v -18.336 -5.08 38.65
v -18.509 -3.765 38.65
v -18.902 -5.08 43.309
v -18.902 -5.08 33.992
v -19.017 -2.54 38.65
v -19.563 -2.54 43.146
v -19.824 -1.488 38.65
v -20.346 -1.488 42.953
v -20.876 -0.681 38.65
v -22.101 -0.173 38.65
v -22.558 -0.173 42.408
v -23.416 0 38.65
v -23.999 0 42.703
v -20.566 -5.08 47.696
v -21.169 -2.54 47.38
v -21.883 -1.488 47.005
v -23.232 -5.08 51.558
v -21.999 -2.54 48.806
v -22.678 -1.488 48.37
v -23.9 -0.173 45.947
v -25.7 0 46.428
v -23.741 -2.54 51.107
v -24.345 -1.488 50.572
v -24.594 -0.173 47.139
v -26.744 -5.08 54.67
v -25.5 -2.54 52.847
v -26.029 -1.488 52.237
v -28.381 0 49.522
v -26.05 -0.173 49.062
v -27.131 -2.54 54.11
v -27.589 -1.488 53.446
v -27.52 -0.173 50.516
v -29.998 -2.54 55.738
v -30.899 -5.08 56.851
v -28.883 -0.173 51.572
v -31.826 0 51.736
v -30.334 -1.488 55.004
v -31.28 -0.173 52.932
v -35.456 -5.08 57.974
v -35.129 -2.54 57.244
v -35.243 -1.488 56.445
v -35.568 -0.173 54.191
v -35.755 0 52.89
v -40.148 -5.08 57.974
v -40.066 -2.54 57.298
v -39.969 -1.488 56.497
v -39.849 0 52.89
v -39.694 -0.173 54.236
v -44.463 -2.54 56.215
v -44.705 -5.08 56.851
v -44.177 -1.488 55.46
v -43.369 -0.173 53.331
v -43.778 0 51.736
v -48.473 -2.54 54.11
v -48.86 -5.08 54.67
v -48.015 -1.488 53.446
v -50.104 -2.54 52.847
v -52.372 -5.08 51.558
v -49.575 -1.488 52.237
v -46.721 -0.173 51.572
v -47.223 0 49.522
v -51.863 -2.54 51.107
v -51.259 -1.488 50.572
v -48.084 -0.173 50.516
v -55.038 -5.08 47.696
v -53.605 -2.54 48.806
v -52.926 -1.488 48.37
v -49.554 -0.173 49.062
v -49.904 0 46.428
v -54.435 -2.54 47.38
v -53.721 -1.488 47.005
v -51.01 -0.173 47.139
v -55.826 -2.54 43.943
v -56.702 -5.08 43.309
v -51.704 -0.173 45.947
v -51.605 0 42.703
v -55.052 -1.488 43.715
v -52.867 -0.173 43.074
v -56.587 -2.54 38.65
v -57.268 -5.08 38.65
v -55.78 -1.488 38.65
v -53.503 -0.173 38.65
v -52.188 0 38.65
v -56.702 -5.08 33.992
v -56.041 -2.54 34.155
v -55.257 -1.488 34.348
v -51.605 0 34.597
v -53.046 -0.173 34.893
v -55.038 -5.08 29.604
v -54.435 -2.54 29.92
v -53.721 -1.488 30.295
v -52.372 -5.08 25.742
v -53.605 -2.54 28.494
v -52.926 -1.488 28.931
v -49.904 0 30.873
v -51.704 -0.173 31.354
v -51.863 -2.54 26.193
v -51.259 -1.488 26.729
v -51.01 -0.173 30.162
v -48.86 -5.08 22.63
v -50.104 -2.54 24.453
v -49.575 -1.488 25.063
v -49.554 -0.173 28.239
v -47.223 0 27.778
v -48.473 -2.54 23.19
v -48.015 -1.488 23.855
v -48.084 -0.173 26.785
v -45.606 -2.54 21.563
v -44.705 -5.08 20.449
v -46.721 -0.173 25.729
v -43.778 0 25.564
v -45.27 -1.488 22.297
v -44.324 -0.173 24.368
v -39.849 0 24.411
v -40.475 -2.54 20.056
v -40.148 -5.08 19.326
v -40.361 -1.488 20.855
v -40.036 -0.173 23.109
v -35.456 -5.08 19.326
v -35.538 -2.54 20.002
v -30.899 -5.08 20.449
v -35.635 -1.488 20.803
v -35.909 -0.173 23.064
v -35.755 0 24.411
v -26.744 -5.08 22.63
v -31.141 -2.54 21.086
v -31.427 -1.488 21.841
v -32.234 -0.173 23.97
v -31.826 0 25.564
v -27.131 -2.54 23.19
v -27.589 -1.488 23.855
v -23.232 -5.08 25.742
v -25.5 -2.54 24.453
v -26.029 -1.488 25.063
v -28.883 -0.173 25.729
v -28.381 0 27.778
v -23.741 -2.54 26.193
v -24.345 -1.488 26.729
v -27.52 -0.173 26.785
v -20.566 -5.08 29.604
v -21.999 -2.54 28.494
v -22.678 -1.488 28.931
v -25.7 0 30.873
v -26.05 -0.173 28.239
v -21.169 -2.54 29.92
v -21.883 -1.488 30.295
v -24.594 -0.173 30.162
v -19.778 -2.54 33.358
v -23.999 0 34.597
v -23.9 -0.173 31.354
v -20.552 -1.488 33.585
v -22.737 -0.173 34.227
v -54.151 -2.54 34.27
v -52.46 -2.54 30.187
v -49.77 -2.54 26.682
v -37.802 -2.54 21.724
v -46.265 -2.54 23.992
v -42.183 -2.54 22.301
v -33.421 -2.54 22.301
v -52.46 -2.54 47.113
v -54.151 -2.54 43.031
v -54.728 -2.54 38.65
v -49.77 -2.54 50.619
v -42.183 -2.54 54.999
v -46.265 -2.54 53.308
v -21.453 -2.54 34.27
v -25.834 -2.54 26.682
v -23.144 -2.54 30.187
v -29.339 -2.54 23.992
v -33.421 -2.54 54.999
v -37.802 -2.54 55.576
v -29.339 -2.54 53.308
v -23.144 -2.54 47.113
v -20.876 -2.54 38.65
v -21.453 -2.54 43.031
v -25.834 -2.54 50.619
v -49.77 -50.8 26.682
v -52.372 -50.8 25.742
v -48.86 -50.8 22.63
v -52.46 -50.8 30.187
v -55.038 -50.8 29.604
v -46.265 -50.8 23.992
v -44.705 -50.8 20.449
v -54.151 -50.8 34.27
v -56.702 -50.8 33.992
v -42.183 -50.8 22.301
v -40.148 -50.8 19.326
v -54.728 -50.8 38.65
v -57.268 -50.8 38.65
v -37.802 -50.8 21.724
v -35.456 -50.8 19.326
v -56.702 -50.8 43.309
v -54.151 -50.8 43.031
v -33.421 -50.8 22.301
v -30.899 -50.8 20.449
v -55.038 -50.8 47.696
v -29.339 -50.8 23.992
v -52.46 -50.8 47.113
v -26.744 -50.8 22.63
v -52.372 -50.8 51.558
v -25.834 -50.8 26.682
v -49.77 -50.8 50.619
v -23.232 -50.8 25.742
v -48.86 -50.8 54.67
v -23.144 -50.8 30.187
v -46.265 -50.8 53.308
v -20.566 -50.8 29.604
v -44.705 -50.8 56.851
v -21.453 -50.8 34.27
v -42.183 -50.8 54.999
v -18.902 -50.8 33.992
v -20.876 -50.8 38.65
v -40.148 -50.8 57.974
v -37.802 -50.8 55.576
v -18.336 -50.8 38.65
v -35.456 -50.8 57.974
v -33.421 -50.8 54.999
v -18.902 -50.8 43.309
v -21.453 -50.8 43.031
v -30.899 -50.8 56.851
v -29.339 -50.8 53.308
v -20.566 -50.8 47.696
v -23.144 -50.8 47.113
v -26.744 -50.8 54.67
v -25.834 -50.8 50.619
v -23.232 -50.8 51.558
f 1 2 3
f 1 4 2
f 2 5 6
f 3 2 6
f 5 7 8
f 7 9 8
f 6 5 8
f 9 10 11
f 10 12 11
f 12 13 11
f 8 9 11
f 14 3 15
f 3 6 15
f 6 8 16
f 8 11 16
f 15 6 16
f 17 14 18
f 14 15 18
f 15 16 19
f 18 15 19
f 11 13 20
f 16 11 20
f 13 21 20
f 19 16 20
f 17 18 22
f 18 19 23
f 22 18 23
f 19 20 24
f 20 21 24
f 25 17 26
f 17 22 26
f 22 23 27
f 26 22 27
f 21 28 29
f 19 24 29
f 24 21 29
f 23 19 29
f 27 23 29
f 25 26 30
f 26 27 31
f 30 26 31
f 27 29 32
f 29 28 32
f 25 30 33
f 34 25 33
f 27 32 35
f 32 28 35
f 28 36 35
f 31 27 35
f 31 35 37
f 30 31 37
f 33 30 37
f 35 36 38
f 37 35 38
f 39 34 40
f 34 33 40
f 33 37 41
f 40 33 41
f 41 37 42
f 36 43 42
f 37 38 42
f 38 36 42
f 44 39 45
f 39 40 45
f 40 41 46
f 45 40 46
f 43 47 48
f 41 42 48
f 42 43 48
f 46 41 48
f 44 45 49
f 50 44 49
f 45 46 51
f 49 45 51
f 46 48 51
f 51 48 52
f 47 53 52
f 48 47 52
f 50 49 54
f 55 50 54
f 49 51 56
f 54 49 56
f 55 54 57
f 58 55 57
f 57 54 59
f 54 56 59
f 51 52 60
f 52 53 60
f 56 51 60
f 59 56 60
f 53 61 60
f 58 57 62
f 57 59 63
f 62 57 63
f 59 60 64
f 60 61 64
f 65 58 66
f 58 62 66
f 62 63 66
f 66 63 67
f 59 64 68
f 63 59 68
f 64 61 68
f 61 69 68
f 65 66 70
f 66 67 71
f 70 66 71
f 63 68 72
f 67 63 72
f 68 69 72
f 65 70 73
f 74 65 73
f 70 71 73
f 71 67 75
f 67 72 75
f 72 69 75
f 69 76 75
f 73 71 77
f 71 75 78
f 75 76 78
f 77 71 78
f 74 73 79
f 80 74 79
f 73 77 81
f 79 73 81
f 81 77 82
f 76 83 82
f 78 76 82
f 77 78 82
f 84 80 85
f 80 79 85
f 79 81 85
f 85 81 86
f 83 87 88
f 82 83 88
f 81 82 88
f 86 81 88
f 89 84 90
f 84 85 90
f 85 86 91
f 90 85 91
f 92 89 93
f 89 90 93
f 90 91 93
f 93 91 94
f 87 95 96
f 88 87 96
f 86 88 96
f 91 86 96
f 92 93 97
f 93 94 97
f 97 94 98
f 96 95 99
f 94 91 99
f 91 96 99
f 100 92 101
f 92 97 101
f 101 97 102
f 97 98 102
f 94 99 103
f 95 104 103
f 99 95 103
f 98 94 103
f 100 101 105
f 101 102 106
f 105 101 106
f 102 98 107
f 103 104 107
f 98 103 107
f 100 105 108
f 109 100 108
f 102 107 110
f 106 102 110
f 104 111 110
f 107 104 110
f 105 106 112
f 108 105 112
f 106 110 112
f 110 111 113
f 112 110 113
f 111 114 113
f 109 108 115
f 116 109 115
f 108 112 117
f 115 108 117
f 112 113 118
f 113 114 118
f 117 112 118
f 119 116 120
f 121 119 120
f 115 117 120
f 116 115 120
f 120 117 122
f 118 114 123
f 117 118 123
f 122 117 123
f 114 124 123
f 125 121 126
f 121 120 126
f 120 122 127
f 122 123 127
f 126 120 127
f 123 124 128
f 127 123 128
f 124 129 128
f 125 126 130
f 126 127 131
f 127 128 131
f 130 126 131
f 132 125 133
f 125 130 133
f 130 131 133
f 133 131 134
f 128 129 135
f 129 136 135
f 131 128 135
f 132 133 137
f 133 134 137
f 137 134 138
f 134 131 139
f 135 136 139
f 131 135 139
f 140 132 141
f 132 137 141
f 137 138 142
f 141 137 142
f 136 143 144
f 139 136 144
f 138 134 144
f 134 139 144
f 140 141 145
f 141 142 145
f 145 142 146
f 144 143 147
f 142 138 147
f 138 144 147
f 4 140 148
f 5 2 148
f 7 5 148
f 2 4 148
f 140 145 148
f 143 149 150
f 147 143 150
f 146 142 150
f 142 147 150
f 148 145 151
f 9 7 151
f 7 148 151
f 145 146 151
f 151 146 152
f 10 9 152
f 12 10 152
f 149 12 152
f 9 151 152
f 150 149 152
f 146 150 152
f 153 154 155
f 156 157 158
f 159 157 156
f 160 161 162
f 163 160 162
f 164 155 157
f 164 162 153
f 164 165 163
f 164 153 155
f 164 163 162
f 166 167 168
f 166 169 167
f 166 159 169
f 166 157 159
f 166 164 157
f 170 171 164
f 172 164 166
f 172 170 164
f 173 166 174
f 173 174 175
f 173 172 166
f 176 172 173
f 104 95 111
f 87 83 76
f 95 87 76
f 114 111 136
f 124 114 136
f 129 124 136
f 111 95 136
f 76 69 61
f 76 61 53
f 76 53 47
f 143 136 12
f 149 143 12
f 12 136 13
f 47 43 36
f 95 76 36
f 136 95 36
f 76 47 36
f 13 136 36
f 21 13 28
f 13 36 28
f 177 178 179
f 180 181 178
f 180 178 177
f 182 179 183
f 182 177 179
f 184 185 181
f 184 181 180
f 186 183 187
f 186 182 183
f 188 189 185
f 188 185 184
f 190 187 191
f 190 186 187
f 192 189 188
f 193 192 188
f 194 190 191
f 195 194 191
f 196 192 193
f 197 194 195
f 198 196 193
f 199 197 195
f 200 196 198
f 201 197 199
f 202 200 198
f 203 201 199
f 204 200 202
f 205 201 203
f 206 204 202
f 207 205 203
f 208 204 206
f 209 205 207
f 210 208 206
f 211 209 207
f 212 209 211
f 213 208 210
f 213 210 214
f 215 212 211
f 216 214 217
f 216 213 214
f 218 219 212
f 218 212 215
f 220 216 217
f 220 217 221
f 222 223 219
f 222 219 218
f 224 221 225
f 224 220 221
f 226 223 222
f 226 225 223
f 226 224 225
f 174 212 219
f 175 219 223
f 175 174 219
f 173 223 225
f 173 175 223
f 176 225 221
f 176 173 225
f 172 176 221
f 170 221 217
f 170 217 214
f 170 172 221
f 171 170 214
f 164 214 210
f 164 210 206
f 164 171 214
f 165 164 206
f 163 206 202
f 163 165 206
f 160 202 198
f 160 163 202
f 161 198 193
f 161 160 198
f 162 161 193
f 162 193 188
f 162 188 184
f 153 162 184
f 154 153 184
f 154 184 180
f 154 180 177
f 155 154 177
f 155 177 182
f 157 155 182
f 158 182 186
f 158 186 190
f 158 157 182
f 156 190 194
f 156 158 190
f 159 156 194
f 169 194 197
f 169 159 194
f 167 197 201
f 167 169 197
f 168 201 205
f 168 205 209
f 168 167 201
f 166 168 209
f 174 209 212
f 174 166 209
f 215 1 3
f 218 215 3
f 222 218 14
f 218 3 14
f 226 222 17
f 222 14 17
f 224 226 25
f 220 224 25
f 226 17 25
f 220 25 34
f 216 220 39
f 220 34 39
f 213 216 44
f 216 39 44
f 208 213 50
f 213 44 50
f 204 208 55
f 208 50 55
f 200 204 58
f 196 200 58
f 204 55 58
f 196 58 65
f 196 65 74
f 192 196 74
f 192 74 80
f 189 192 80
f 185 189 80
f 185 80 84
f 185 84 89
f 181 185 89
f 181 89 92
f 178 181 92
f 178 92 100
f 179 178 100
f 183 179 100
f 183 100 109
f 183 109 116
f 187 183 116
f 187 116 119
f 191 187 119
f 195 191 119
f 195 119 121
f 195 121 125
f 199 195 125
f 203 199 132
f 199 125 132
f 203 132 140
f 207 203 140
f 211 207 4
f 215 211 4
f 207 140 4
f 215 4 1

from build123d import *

# Parameters (mm, degrees)
F0_R     = 19.4658001659
F1_DEPTH = 25.4
F2_T     = -2.54
F3_DEPTH = 25.4
F4_DEPTH = 25.4
F5_R     = 5.08


with BuildPart() as f1:
    # F0 (on Front) → F1 (new body)
    with BuildSketch(Plane.XZ):
        with Locations((-37.8019884229, 38.6502295732)):
            Circle(F0_R)
    extrude(amount=F1_DEPTH)

    # F2
    f2_openings = [f1.faces().sort_by_distance(p)[0] for p in [
        (-37.801988, -25.4, 38.65023),
    ]]
    offset(amount=F2_T, openings=f2_openings)

    # F3 (add): a face of the model
    f3_faces = [f1.faces().sort_by_distance(p)[0] for p in [
        (-56.7172126168, -25.4, 38.6502295732),
    ]]
    extrude(f3_faces, amount=-F3_DEPTH)

    # F4 (add): a face of the model
    f4_faces = [f1.faces().sort_by_distance(p)[0] for p in [
        (-56.7172126168, -25.4, 38.6502295732),
    ]]
    extrude(f4_faces, amount=F4_DEPTH)

    # F5
    f5_edges = [f1.edges().sort_by_distance(p)[0] for p in [
        (-57.267789, 0, 38.65023),
    ]]
    fillet(f5_edges, radius=F5_R)


solid = f1.part
